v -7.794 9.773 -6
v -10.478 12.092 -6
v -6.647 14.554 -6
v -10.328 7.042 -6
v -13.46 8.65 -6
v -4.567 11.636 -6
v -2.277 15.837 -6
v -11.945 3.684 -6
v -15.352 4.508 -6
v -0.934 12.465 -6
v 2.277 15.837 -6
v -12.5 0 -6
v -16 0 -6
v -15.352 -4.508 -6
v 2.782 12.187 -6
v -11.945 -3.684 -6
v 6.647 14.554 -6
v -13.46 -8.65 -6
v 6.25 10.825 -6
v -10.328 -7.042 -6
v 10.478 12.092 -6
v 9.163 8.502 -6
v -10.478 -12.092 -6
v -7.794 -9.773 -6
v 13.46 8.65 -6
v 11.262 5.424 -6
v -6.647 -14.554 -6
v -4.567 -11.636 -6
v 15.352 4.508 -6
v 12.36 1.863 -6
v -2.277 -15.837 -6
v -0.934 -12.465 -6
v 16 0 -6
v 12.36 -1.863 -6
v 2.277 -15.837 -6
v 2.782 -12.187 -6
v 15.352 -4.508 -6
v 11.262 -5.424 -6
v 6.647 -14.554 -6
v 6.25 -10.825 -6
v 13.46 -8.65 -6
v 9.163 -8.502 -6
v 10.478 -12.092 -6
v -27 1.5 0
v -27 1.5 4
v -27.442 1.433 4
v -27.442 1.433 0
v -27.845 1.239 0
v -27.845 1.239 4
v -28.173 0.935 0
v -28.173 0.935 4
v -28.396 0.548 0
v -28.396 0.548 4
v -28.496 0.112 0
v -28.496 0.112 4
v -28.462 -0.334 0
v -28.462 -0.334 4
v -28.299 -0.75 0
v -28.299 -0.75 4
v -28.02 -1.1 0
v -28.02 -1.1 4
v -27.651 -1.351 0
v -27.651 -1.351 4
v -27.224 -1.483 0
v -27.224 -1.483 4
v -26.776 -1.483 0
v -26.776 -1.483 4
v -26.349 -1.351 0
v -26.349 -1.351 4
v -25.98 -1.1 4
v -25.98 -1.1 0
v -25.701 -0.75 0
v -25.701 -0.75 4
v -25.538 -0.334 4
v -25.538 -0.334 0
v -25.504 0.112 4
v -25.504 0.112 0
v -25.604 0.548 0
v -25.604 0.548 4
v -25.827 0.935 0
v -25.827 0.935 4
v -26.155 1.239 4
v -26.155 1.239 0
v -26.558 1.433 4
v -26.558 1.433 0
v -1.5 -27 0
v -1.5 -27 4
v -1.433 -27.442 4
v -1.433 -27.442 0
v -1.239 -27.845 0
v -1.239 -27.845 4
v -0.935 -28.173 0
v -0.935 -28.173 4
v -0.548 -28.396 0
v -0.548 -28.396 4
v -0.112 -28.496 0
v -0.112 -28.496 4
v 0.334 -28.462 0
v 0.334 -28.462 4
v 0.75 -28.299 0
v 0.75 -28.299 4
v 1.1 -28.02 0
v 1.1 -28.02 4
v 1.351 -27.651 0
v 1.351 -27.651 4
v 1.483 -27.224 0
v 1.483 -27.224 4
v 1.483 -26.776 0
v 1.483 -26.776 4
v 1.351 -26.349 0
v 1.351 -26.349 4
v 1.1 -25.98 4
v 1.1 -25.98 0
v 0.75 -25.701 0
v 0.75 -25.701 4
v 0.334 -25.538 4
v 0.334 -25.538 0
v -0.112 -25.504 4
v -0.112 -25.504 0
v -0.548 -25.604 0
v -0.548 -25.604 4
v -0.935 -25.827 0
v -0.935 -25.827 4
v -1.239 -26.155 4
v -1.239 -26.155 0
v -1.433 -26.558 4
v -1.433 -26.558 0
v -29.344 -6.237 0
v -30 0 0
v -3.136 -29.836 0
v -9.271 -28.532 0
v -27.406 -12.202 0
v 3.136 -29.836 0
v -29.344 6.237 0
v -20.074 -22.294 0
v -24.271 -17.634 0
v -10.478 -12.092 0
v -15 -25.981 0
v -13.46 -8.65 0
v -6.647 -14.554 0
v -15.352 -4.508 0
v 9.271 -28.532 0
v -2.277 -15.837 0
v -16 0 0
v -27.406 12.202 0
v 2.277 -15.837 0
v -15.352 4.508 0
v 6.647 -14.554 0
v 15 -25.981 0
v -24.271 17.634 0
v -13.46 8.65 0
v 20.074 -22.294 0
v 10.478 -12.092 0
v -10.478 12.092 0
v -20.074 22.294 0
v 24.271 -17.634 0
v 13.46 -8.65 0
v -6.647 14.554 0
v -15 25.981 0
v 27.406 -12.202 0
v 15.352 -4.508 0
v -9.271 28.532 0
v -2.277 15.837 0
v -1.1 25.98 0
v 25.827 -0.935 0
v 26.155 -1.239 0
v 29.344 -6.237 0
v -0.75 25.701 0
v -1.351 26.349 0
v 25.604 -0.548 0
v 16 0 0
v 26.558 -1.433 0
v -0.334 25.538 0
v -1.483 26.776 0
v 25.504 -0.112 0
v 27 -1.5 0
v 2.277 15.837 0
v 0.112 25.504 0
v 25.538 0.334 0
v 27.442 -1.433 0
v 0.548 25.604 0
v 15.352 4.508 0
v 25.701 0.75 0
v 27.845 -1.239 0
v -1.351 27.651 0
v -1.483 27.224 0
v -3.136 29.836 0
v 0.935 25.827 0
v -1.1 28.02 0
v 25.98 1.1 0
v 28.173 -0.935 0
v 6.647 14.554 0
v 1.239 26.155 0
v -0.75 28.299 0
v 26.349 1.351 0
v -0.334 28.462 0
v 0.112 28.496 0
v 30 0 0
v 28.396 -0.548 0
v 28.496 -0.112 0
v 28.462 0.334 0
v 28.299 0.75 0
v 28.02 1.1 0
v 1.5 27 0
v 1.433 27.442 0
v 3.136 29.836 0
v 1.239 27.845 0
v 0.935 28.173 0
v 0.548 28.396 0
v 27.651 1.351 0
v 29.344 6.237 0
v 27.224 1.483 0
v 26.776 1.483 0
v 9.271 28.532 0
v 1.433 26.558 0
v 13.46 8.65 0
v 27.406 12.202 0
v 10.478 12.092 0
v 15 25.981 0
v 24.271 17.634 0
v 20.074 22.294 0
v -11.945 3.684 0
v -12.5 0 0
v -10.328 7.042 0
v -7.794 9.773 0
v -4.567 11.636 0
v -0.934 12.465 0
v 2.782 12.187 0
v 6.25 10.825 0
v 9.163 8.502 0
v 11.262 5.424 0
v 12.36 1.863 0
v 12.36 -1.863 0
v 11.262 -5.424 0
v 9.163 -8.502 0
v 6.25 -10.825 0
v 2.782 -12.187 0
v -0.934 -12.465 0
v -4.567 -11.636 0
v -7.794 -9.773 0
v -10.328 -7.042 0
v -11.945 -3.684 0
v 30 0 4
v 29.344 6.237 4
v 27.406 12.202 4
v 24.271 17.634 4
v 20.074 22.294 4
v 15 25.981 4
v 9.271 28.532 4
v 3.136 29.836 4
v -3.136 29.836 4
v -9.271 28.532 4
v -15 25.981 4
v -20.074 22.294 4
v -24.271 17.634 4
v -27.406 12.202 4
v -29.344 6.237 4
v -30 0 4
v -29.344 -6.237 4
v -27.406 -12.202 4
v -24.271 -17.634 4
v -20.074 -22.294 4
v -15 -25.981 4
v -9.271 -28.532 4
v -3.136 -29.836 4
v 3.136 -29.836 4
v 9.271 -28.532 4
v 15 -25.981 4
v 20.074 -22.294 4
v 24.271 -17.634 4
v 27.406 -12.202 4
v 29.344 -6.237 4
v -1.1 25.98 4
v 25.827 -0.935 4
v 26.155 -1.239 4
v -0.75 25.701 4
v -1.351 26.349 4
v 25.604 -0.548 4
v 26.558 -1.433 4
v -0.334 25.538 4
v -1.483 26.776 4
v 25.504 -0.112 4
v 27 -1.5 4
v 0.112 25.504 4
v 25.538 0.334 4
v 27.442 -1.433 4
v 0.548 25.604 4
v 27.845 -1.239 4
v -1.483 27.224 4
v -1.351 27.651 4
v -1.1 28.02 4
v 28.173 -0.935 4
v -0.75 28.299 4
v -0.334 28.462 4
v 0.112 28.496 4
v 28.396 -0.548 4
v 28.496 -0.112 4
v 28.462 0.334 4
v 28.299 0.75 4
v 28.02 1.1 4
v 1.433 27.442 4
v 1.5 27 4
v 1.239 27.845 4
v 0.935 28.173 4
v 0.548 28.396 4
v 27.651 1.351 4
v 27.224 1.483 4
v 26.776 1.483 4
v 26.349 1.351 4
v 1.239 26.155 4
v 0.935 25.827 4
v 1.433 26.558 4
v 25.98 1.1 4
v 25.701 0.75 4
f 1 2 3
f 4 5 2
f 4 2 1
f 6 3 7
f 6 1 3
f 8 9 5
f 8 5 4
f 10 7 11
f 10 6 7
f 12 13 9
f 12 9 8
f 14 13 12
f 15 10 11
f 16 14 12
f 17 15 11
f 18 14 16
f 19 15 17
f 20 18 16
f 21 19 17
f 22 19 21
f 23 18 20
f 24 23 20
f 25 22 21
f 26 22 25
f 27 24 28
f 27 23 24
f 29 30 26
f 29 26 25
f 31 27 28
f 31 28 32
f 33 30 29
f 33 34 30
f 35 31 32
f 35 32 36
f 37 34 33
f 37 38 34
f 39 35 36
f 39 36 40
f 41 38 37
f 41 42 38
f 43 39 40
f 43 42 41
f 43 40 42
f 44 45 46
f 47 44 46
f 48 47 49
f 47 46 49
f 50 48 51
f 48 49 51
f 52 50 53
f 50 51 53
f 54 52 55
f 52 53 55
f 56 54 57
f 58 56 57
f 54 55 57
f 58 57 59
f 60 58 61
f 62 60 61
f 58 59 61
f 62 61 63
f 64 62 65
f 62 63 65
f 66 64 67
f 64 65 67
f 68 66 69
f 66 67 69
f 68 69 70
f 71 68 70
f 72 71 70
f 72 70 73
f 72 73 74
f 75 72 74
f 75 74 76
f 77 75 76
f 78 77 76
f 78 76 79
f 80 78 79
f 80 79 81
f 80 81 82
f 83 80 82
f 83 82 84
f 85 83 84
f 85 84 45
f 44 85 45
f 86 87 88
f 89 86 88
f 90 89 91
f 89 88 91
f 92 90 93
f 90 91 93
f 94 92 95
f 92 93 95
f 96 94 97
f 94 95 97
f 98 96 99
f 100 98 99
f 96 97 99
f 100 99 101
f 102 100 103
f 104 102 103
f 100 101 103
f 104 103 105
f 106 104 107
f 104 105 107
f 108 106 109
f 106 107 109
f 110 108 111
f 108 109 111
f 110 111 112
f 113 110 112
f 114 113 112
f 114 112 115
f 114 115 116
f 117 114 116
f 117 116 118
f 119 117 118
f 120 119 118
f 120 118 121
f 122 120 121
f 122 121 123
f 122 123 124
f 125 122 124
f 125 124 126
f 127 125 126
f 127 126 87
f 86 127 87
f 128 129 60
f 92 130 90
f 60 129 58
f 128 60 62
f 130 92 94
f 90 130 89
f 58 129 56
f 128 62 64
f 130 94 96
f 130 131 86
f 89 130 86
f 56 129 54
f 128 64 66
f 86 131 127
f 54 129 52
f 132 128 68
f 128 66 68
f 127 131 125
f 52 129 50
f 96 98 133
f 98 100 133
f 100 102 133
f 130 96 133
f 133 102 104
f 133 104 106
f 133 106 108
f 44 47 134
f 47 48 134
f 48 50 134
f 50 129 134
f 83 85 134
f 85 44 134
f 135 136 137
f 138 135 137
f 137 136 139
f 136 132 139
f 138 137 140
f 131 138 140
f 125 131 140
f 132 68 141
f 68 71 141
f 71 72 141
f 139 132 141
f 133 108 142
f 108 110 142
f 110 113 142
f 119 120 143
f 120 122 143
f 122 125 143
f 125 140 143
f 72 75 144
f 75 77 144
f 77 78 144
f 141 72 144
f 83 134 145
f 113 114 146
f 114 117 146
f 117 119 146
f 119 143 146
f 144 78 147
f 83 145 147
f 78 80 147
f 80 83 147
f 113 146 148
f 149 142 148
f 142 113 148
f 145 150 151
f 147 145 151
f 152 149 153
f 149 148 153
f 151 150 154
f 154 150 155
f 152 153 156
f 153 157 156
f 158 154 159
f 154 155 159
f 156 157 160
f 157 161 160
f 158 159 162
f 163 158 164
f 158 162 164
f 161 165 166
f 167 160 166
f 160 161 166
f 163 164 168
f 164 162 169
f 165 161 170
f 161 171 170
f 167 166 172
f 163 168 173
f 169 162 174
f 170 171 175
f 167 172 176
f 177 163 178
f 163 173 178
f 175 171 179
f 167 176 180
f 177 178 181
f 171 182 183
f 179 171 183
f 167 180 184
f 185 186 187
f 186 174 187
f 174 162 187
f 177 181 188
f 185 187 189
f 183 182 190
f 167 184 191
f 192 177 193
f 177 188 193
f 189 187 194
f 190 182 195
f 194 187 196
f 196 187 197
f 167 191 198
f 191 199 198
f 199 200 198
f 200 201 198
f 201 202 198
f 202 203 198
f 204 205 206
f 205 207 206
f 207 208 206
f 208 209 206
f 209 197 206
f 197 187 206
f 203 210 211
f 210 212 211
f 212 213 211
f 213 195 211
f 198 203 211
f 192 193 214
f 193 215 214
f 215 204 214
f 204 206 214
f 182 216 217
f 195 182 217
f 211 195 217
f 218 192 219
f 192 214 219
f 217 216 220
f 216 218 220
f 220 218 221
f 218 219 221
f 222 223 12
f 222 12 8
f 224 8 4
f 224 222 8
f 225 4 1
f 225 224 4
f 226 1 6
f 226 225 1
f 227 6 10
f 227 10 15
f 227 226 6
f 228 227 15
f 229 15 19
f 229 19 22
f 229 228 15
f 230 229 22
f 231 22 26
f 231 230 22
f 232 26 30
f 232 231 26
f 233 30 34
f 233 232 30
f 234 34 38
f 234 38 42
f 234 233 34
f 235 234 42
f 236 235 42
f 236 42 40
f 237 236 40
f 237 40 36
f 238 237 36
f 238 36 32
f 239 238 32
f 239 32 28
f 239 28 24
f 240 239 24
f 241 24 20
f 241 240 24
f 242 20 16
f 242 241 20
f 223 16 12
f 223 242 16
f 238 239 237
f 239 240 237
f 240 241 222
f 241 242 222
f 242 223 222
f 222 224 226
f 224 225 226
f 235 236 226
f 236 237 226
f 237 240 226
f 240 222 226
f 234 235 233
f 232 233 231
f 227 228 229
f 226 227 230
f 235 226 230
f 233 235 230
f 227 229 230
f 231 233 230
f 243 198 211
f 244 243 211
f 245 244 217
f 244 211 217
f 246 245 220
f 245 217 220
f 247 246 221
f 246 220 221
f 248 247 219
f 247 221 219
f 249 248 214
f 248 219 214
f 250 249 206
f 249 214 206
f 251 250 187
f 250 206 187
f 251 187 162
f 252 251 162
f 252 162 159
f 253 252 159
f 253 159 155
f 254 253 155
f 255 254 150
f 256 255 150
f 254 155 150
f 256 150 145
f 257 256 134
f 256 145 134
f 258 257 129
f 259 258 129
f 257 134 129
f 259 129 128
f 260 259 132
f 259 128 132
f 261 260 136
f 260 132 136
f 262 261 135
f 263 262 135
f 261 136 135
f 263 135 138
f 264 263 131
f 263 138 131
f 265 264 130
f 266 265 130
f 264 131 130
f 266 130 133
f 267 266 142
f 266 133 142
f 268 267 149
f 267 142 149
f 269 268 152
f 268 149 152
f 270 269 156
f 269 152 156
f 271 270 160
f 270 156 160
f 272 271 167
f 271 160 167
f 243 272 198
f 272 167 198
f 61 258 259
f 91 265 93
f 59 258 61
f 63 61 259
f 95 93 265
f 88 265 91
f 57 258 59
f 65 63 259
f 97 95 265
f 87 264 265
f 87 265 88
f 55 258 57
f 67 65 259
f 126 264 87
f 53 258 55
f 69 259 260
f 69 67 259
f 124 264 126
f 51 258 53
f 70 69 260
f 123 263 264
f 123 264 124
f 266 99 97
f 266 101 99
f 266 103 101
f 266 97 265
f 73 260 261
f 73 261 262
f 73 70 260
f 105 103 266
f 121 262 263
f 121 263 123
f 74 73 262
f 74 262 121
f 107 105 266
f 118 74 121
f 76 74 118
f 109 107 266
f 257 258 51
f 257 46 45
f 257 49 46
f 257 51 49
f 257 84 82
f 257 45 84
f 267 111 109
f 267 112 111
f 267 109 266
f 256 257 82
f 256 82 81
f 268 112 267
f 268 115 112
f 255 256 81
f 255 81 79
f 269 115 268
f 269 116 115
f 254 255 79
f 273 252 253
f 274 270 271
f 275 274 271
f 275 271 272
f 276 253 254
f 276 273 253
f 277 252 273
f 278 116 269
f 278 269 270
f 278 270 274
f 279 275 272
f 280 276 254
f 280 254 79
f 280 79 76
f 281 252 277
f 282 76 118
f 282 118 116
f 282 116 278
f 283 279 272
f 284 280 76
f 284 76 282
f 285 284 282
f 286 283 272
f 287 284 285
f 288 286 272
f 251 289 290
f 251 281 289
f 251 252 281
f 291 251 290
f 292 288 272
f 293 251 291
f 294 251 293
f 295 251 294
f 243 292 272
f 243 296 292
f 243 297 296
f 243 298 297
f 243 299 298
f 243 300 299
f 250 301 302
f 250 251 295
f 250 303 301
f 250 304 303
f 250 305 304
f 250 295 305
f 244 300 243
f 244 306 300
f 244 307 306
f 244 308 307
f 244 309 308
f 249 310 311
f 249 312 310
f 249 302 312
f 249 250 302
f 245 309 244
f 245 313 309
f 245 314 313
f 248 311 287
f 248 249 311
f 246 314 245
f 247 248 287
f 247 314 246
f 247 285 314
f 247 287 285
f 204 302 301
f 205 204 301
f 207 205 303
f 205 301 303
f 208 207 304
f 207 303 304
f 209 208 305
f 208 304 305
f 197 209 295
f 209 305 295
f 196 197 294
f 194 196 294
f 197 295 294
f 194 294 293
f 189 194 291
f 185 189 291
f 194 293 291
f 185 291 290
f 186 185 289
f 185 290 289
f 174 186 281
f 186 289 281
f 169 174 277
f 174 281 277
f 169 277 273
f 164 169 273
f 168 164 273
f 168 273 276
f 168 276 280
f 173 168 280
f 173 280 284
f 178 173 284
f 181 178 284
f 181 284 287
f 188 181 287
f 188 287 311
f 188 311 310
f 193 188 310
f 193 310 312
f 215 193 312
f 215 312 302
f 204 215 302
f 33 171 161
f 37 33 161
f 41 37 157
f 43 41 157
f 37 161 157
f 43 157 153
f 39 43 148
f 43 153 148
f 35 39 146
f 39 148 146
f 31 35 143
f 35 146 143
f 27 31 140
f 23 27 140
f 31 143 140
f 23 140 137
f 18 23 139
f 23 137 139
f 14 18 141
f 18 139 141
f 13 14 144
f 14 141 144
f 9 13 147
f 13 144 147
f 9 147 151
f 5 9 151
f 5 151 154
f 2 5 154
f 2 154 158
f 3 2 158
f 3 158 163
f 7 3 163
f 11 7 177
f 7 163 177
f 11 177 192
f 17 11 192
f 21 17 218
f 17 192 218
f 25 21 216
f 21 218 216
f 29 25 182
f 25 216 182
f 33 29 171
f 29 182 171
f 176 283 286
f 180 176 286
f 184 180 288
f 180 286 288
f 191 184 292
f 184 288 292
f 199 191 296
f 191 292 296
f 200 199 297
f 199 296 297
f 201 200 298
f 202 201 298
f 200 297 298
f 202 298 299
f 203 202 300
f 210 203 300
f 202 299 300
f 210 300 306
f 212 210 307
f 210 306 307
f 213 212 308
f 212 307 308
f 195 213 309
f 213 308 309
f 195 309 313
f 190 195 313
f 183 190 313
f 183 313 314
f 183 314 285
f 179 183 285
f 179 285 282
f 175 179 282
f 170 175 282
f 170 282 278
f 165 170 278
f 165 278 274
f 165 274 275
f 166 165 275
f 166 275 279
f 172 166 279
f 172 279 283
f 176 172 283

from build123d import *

# Parameters (mm, degrees)
SKETCH_1_R               = 30
EXTRUDE_1_DEPTH          = 4
SKETCH_3_R               = 1.5
CUT_EXTRUDE_1_DEPTH      = 10
PATTERN_CIRCULAR_1_COUNT = 4
SKETCH_4_R               = 16
SKETCH_4_R_2             = 12.5
EXTRUDE_2_DEPTH          = 6


with BuildPart() as part:
    # 草图1 → 凸台-拉伸1 (new body)
    with BuildSketch(Plane.XY):
        Circle(SKETCH_1_R)
    extrude(amount=EXTRUDE_1_DEPTH)

    # 草图3 → 切除-拉伸1 (cut)
    with BuildSketch(Plane.XY.offset(4)):
        with Locations((0, 27)):
            Circle(SKETCH_3_R)
    cut_extrude_1 = extrude(amount=-CUT_EXTRUDE_1_DEPTH, mode=Mode.SUBTRACT)

    # 阵列(圆周)1: 切除-拉伸1 ×4 about axis
    pattern_circular_1_axis = Axis((0, 0, 0), (0, 0, 1))
    for i in range(1, PATTERN_CIRCULAR_1_COUNT):
        add(cut_extrude_1.rotate(pattern_circular_1_axis, i * 360 / PATTERN_CIRCULAR_1_COUNT), mode=Mode.SUBTRACT)

    # 草图4 → 凸台-拉伸2 (add)
    with BuildSketch(Plane(origin=(0, 0, 0), x_dir=(-1, 0, 0), z_dir=(0, 0, -1))):
        with Locations(Location((0, 0, 0), (0, 0, 180))):
            Circle(SKETCH_4_R)
        Circle(SKETCH_4_R_2, mode=Mode.SUBTRACT)
    extrude(amount=EXTRUDE_2_DEPTH)


solid = part.part
